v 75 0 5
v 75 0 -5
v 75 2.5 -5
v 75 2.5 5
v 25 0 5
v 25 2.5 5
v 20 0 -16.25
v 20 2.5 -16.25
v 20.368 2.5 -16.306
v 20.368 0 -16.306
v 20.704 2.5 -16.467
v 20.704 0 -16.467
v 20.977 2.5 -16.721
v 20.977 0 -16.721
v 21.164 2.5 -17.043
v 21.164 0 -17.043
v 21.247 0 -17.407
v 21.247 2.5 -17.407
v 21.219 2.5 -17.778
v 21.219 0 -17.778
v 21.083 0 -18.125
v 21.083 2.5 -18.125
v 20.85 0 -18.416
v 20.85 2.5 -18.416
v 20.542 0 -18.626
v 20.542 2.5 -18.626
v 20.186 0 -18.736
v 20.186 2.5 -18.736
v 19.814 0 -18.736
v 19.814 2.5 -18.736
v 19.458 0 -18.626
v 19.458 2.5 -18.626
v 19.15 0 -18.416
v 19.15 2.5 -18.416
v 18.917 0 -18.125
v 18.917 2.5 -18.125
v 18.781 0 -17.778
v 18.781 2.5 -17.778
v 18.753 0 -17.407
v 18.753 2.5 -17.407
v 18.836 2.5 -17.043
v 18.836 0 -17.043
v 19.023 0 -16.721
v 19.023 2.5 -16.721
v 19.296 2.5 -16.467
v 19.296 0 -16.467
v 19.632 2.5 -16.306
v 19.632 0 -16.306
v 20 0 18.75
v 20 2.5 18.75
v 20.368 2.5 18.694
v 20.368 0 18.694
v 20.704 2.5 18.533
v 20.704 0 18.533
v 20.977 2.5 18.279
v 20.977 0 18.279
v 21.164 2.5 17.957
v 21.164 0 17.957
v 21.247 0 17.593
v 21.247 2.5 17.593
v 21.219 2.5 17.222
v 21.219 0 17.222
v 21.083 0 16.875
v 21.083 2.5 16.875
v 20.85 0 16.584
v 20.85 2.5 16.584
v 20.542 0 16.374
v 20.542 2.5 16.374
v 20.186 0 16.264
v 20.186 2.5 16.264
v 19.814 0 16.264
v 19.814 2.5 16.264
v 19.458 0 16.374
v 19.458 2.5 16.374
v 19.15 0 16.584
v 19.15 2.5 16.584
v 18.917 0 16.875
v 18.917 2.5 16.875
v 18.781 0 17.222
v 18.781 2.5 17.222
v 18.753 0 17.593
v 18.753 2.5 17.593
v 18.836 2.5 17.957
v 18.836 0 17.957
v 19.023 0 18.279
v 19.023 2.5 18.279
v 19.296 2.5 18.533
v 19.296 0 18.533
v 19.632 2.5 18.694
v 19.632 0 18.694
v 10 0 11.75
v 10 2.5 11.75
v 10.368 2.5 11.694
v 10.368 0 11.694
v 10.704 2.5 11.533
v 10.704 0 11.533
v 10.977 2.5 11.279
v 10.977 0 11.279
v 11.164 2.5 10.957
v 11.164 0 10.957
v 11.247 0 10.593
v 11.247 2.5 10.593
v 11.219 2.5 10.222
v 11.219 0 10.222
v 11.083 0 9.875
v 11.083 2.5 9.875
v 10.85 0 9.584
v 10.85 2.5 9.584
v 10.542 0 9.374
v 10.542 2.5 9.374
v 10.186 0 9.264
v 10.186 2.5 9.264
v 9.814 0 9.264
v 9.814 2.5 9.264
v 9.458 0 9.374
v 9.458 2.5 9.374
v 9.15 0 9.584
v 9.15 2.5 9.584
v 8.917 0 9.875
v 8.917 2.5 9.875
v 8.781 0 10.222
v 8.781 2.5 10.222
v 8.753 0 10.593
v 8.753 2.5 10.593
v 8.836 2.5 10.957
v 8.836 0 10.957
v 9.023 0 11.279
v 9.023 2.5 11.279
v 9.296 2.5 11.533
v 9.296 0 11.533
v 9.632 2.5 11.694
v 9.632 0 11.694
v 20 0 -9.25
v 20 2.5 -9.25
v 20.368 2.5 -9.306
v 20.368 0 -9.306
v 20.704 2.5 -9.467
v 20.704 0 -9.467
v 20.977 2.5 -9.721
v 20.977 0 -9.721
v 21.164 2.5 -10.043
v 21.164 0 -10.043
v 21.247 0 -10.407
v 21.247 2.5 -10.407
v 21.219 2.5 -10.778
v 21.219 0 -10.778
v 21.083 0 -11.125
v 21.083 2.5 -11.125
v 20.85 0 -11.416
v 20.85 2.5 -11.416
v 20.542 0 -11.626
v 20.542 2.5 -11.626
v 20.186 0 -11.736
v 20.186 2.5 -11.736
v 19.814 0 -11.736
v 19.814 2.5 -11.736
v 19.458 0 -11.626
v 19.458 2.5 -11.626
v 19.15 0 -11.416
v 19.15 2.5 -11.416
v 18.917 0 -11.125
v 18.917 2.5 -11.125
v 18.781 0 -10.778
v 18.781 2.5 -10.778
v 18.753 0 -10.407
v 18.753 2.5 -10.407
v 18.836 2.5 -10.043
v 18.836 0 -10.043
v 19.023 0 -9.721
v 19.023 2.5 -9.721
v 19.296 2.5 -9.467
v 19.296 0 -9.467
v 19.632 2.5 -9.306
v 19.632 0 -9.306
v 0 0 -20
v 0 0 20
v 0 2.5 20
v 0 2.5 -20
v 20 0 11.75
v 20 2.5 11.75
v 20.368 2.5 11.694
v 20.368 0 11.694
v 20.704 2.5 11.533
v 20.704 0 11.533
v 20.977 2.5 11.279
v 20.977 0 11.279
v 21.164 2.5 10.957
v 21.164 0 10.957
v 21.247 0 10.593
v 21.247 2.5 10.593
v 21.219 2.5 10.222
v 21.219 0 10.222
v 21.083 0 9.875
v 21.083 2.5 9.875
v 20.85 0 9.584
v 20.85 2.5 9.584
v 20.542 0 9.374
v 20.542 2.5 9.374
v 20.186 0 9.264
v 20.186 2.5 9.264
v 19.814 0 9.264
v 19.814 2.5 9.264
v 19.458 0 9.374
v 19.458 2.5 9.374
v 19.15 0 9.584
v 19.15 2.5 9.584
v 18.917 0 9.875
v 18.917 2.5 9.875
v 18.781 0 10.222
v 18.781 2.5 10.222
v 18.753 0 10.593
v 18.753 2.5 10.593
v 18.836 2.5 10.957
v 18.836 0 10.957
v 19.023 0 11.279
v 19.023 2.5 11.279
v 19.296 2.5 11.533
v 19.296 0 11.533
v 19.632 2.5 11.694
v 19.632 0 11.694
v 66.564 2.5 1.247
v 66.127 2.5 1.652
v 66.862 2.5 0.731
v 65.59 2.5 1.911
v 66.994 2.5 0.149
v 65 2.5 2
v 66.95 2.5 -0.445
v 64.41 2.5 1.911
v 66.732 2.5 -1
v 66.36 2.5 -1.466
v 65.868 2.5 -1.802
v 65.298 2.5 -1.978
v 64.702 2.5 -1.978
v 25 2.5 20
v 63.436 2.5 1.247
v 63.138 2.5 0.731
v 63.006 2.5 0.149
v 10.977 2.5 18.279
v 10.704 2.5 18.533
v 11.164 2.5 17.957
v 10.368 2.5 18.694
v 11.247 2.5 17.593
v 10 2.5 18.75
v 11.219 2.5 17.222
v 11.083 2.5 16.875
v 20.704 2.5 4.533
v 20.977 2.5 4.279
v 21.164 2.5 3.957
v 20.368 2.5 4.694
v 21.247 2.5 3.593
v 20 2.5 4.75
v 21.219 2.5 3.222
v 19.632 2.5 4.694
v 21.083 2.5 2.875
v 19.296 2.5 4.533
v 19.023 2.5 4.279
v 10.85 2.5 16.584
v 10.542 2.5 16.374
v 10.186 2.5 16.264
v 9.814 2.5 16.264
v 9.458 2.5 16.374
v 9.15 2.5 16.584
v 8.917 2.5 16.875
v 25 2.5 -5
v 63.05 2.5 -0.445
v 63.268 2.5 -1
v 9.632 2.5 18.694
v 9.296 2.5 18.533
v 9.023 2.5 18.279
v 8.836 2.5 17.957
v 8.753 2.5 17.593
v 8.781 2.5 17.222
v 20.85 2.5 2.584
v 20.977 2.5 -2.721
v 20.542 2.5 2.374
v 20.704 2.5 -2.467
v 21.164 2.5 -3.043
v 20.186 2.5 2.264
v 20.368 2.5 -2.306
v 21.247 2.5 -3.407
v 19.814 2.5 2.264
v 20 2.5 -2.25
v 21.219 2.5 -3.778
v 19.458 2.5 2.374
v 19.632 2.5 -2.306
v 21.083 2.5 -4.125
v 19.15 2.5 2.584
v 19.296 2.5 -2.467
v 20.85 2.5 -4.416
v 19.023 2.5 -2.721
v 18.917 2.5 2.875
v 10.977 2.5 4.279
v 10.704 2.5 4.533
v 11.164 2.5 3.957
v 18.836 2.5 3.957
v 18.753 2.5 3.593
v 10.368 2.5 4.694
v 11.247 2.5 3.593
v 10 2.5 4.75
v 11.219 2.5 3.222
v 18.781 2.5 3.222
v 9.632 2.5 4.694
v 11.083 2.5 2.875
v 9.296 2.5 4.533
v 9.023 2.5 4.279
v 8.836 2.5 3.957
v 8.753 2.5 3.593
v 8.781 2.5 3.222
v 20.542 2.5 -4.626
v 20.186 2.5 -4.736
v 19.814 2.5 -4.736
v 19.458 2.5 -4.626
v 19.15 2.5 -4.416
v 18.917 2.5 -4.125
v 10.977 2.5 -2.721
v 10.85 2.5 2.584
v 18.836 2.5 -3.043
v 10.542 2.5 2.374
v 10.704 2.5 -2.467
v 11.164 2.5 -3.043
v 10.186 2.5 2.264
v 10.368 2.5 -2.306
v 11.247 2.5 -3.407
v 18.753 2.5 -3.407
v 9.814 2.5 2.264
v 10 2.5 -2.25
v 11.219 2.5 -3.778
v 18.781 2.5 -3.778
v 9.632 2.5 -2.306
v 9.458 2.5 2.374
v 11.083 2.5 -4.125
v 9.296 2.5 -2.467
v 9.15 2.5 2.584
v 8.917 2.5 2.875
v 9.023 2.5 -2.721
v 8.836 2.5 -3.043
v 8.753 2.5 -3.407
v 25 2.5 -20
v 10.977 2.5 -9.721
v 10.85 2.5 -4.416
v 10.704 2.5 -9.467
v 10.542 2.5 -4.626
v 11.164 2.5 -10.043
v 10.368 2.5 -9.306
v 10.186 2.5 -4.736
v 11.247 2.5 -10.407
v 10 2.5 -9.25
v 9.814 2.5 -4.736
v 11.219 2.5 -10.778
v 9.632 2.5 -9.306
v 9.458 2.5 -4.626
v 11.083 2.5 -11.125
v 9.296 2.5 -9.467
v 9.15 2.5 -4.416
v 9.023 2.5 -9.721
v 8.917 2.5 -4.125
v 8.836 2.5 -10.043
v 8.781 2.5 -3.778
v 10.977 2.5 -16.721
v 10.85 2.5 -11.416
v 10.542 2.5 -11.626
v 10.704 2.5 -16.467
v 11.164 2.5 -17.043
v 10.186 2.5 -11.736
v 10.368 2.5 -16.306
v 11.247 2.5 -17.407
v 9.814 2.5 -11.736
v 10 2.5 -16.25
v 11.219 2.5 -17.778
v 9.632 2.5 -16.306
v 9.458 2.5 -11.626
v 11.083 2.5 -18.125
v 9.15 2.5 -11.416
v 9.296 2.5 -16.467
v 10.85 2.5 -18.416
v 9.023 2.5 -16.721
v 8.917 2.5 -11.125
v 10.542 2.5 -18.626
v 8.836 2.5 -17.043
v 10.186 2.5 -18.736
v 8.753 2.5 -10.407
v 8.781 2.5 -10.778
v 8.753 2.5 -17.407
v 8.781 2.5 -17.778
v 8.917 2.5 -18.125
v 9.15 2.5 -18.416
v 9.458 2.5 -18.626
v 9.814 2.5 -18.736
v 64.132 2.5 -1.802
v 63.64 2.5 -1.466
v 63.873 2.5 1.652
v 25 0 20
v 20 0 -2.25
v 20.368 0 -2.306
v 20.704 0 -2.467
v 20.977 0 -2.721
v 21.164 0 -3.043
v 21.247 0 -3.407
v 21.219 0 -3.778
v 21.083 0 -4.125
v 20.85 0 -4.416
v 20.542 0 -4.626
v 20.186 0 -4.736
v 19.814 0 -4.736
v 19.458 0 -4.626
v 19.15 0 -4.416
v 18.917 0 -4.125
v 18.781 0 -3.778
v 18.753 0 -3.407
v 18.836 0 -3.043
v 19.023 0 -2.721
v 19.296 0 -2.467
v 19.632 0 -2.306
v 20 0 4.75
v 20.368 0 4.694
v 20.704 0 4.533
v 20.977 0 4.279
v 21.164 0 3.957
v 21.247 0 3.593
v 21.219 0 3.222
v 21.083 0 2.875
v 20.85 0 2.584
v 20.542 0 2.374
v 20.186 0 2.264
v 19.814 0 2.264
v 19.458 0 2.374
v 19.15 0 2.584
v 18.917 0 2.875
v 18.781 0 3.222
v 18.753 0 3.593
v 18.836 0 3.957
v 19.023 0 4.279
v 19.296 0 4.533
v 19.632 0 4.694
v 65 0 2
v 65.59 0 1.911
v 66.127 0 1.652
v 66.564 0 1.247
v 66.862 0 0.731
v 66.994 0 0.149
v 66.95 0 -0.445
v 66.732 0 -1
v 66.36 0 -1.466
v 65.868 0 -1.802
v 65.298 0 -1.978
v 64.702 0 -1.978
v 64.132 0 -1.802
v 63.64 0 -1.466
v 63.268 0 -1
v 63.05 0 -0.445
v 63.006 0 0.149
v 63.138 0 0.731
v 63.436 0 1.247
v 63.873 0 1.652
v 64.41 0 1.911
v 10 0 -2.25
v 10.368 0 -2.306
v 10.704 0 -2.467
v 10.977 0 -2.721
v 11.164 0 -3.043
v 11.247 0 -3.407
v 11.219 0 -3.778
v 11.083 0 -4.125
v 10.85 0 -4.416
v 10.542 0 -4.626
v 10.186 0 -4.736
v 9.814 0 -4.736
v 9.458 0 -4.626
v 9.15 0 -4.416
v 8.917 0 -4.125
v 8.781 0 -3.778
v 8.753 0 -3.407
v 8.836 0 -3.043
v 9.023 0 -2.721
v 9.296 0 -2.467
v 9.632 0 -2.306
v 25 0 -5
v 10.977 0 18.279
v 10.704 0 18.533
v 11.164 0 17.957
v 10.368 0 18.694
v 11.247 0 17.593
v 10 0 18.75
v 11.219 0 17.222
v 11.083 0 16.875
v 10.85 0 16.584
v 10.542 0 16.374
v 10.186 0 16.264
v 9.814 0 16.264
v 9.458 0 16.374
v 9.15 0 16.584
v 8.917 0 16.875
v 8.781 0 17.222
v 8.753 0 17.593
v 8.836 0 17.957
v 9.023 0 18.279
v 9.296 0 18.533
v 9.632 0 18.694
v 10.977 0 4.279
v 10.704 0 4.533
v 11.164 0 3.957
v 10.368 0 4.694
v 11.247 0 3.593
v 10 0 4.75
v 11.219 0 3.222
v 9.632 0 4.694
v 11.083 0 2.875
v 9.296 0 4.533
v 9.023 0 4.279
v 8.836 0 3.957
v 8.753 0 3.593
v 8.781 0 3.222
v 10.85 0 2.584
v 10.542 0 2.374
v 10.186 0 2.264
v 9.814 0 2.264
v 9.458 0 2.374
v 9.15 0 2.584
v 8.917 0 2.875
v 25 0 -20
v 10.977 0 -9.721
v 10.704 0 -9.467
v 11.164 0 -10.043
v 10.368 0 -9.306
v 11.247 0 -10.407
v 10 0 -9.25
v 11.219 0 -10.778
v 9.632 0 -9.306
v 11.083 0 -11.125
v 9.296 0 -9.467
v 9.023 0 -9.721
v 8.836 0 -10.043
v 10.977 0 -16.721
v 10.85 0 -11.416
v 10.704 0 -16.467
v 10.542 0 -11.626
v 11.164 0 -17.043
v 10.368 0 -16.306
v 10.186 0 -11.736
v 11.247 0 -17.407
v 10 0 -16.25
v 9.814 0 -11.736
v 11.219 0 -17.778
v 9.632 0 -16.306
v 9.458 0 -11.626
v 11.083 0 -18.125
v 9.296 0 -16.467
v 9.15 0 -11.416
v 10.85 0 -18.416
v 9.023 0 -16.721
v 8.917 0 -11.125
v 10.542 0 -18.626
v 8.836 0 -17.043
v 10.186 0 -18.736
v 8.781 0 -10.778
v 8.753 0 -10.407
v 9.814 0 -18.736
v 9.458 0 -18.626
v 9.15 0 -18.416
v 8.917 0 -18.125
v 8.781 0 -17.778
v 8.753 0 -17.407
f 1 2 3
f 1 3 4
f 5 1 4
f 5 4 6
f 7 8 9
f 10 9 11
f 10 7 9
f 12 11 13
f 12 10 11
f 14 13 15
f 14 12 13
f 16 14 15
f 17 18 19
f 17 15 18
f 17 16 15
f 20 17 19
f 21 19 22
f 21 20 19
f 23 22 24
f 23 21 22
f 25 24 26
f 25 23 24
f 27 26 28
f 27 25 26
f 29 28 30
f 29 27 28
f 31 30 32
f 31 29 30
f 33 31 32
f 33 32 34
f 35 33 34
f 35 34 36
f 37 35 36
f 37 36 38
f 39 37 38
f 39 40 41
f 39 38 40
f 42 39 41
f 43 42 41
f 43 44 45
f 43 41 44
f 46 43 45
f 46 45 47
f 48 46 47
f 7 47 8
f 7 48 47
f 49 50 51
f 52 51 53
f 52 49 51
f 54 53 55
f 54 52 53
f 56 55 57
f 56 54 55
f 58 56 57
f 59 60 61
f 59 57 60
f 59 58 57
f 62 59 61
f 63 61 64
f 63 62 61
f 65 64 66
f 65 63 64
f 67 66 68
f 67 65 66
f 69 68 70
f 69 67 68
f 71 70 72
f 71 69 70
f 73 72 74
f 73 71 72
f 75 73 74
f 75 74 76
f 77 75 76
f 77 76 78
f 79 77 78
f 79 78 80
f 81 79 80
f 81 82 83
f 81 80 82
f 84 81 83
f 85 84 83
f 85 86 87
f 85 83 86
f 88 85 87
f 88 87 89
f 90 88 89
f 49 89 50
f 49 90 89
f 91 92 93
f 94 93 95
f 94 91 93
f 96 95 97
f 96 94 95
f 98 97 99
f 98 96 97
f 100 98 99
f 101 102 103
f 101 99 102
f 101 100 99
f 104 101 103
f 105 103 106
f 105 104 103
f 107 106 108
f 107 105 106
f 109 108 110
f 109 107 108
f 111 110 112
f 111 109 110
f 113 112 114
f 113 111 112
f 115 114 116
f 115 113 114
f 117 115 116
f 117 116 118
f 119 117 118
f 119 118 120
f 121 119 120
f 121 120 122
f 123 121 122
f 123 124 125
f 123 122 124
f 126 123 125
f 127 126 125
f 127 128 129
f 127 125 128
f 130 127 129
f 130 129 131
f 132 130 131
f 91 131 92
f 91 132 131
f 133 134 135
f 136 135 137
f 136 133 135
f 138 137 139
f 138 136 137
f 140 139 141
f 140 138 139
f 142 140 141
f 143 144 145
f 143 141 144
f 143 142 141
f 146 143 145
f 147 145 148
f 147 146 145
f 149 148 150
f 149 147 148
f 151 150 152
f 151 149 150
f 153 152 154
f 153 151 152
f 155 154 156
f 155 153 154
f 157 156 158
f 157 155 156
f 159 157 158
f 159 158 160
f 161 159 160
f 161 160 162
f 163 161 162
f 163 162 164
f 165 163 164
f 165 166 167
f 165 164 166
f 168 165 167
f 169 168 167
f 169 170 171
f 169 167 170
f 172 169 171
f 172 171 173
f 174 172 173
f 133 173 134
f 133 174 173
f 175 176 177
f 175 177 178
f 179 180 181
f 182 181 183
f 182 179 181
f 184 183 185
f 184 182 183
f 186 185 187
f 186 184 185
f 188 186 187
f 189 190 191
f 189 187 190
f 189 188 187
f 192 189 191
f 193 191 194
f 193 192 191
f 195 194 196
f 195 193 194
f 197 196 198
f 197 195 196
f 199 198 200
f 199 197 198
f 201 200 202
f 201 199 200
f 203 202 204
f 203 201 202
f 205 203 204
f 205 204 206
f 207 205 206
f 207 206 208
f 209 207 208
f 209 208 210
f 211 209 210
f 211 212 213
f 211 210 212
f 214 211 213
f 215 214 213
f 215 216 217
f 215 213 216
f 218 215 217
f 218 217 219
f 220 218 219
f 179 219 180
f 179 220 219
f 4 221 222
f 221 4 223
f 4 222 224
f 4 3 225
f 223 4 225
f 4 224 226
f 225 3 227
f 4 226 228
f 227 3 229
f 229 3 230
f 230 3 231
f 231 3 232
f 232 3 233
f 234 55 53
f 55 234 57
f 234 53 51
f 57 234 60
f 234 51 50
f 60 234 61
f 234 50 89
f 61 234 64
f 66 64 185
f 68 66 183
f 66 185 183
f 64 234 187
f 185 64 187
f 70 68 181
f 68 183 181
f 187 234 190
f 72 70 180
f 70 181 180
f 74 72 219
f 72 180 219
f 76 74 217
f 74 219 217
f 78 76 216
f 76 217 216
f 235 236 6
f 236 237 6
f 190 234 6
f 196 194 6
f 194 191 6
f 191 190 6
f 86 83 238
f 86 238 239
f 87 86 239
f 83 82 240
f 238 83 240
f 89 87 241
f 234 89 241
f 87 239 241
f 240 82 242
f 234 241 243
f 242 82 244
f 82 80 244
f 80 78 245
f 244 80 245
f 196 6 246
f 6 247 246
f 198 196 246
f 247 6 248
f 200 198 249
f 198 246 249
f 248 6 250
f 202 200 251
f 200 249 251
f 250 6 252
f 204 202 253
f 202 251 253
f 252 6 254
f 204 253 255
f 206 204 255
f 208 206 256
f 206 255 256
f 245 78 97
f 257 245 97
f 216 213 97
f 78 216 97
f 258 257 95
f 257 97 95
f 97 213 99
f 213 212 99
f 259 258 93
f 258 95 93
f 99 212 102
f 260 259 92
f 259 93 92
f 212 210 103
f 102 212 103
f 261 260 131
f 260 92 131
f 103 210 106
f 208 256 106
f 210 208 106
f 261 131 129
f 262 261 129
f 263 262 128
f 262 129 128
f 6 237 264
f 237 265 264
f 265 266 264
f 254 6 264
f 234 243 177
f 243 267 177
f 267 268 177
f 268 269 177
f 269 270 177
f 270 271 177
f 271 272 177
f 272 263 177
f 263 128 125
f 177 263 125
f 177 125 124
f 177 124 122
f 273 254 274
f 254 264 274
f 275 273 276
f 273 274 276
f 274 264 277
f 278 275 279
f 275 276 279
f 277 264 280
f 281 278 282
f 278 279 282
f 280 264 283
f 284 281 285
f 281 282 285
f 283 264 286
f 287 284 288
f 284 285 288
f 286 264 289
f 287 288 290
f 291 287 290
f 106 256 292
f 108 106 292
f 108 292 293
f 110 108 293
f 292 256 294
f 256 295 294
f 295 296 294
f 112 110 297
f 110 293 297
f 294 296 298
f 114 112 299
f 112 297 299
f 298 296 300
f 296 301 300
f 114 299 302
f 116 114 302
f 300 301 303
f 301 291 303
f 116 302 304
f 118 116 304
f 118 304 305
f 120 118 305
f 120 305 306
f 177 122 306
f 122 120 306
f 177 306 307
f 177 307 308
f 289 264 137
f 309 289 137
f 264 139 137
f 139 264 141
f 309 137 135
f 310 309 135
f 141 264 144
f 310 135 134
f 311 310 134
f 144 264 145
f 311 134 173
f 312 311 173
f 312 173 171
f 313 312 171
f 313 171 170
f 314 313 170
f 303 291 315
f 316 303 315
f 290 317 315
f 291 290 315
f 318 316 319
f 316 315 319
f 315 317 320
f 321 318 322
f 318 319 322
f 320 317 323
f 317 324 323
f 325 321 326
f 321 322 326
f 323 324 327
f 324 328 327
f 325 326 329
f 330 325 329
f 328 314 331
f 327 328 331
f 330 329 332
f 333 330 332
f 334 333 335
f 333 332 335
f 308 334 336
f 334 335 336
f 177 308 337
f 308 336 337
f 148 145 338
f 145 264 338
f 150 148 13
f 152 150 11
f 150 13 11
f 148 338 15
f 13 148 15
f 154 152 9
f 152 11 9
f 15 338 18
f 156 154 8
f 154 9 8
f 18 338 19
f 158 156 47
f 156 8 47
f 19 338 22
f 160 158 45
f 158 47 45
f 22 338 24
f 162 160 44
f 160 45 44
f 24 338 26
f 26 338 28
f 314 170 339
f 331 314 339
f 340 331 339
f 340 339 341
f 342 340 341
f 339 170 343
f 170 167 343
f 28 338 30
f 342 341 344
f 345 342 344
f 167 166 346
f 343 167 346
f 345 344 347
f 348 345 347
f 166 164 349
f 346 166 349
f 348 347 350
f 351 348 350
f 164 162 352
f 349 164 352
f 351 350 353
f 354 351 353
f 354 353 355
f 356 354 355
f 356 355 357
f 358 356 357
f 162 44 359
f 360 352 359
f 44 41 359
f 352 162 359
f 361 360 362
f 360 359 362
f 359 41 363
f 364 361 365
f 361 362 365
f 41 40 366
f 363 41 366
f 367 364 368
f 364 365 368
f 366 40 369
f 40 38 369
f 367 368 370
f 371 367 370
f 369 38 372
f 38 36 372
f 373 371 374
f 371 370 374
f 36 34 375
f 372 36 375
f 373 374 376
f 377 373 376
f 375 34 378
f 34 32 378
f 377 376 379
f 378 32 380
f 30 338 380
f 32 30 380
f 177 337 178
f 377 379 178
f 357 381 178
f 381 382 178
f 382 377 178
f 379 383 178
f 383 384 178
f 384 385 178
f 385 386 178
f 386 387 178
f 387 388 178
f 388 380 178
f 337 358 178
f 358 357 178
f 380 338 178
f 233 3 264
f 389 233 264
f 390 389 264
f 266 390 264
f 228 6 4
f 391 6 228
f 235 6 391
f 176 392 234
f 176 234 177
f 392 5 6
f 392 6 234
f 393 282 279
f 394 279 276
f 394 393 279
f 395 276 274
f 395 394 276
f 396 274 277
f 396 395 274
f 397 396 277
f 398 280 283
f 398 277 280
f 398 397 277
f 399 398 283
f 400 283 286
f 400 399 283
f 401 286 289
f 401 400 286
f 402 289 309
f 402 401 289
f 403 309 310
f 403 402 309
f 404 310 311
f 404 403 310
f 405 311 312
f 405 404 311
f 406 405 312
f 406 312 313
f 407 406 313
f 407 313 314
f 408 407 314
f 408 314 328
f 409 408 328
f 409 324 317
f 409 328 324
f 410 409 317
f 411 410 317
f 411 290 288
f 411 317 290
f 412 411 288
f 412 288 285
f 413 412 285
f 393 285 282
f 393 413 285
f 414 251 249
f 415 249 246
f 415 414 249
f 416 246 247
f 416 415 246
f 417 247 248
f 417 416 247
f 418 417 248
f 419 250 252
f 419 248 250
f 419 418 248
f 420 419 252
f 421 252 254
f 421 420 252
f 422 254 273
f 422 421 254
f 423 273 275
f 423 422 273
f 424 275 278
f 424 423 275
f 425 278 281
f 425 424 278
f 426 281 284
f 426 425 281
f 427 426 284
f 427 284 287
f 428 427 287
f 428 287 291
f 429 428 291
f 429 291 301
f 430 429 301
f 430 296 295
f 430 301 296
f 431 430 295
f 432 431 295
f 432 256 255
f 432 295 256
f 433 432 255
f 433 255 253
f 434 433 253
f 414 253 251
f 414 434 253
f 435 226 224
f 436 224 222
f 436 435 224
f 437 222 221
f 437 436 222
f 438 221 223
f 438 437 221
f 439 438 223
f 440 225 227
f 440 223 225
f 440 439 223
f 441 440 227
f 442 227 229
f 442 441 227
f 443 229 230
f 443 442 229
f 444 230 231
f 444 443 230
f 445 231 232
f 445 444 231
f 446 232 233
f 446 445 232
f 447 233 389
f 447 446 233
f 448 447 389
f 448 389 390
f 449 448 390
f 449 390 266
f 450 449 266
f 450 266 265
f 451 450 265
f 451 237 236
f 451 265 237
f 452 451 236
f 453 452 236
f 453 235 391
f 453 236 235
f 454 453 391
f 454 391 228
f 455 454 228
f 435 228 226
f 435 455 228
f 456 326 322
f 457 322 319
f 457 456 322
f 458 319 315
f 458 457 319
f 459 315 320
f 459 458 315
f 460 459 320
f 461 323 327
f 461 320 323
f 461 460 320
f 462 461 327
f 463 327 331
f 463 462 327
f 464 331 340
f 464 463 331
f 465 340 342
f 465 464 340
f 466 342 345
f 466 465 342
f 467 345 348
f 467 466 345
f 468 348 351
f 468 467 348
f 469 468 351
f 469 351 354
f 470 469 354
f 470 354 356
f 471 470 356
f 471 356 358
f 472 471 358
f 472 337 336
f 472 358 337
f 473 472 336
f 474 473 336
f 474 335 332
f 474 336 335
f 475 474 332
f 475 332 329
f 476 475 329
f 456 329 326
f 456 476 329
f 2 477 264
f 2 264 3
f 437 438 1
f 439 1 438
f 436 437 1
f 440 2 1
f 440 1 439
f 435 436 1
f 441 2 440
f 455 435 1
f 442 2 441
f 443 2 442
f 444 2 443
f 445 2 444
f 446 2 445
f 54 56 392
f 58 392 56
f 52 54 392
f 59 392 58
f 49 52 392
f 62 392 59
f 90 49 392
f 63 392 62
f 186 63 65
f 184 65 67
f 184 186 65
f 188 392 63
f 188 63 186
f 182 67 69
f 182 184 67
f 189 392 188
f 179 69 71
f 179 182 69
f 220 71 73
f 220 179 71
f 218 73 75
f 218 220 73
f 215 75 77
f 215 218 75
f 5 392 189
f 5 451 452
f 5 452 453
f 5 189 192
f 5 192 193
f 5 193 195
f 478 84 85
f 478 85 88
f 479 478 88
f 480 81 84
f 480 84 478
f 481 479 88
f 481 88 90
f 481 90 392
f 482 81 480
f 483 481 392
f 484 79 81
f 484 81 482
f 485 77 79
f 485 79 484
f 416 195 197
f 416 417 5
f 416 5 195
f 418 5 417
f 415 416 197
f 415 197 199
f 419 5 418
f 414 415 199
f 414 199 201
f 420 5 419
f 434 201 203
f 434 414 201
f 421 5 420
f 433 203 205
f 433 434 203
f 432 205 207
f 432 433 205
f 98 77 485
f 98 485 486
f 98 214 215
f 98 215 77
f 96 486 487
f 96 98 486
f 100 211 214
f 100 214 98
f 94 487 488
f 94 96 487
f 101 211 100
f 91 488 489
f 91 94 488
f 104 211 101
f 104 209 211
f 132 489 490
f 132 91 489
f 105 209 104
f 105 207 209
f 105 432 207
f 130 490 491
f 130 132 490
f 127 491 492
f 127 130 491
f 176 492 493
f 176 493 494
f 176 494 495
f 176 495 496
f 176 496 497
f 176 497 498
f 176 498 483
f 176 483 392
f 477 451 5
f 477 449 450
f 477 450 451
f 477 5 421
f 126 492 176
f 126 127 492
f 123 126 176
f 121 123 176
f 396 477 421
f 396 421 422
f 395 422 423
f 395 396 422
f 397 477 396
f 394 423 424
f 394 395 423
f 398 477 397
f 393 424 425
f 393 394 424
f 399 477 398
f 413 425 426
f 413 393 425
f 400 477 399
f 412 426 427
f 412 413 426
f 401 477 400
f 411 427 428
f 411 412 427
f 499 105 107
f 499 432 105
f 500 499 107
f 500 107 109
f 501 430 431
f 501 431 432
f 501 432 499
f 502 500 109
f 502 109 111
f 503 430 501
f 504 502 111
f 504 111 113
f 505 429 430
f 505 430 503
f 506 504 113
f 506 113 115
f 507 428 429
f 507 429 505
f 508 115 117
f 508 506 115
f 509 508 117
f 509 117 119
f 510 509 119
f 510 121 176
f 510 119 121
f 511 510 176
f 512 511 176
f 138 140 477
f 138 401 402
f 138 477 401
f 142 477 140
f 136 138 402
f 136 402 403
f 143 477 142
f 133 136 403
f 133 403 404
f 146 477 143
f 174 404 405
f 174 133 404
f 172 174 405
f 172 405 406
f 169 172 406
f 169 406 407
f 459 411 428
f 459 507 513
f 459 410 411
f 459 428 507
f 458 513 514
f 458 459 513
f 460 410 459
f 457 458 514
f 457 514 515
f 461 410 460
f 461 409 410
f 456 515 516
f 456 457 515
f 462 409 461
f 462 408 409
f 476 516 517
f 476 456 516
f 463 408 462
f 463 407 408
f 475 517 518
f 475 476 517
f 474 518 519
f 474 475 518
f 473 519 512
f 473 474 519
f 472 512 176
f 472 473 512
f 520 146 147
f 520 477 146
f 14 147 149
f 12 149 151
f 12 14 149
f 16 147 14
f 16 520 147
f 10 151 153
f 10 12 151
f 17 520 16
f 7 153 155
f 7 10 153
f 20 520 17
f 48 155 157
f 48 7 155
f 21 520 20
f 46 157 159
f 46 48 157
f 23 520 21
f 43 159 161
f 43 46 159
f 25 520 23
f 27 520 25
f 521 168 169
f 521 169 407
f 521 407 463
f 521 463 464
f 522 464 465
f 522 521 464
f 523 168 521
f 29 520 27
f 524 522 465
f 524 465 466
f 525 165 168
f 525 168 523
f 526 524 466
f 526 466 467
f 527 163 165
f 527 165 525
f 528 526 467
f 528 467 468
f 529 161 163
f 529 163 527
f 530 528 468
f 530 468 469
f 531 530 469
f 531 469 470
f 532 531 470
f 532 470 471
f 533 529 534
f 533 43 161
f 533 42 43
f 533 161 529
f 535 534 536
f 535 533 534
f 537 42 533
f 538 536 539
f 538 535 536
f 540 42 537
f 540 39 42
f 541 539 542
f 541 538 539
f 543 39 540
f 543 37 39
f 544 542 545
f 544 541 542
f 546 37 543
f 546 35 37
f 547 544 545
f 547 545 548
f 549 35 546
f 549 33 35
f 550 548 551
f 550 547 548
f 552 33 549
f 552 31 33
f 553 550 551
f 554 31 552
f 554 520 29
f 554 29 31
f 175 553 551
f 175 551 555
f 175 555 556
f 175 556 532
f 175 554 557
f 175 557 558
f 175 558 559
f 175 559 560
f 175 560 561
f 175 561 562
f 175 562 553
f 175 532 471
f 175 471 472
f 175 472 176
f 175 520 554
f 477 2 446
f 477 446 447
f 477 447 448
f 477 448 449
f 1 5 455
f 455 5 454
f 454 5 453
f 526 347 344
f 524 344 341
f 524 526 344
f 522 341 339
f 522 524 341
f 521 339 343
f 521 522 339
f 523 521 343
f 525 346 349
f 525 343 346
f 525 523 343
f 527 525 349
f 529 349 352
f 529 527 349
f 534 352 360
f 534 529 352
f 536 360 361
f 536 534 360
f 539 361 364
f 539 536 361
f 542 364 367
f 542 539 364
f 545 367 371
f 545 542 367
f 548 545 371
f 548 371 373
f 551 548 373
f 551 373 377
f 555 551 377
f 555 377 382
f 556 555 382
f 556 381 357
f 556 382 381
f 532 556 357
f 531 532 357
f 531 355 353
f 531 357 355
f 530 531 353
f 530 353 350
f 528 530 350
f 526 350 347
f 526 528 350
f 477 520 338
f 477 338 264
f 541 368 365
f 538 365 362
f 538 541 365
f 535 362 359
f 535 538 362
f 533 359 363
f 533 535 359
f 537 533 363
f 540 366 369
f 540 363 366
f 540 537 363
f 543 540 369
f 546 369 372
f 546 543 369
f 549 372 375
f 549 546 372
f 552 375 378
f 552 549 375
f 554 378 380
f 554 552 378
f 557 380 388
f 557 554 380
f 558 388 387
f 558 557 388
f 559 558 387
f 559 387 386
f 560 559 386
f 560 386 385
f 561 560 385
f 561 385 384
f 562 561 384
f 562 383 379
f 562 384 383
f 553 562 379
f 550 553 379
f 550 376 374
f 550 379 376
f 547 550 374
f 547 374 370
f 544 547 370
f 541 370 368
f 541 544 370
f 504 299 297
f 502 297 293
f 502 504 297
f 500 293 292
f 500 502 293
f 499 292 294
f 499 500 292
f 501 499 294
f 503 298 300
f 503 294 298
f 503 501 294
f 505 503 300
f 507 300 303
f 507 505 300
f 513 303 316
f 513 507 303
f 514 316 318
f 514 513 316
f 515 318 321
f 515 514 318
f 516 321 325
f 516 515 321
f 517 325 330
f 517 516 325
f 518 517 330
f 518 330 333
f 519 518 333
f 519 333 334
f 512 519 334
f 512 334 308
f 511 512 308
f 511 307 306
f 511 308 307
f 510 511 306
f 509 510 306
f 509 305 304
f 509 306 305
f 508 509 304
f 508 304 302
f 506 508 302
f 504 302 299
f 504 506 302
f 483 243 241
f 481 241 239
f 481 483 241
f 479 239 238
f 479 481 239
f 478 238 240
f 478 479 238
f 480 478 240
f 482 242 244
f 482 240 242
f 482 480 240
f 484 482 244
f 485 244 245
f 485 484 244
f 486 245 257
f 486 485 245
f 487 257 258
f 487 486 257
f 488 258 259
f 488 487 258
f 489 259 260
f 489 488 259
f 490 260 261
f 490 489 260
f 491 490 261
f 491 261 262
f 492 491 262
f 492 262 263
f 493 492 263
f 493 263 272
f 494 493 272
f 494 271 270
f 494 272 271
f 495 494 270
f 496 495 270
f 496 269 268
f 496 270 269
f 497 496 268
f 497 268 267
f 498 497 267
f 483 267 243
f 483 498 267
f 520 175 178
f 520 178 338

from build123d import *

# Parameters (mm, degrees)
EXTRUDE_1_DEPTH     = 2.5
SKETCH_2_R          = 1.25
CUT_EXTRUDE_1_DEPTH = 78.661122835
SKETCH_3_R          = 2
CUT_EXTRUDE_2_DEPTH = 10


with BuildPart() as part:
    # 草图1 → 凸台-拉伸1 (new body)
    with BuildSketch(Plane(origin=(0, 0, 0), x_dir=(1, 0, 0), z_dir=(0, 1, 0))):
        Polygon((0, -20), (0, 20), (25, 20), (25, 5), (75, 5), (75, -5), (25, -5), (25, -20), align=None)
    extrude(amount=EXTRUDE_1_DEPTH)

    # 草图2 → 切除-拉伸1 (cut, through all)
    with BuildSketch(Plane(origin=(0, 0, 0), x_dir=(1, 0, 0), z_dir=(0, 1, 0))):
        with Locations(Location((10, 17.5, 0), (0, 0, 270))):
            Circle(SKETCH_2_R)
        with Locations(Location((20, 17.5, 0), (0, 0, 270))):
            Circle(SKETCH_2_R)
        with Locations(Location((20, 10.5, 0), (0, 0, 270))):
            Circle(SKETCH_2_R)
        with Locations(Location((20, 3.5, 0), (0, 0, 270))):
            Circle(SKETCH_2_R)
        with Locations(Location((20, -3.5, 0), (0, 0, 270))):
            Circle(SKETCH_2_R)
        with Locations(Location((20, -10.5, 0), (0, 0, 270))):
            Circle(SKETCH_2_R)
        with Locations(Location((20, -17.5, 0), (0, 0, 270))):
            Circle(SKETCH_2_R)
        with Locations(Location((10, 10.5, 0), (0, 0, 270))):
            Circle(SKETCH_2_R)
        with Locations(Location((10, 3.5, 0), (0, 0, 270))):
            Circle(SKETCH_2_R)
        with Locations(Location((10, -3.5, 0), (0, 0, 270))):
            Circle(SKETCH_2_R)
        with Locations(Location((10, -10.5, 0), (0, 0, 270))):
            Circle(SKETCH_2_R)
        with Locations(Location((10, -17.5, 0), (0, 0, 270))):
            Circle(SKETCH_2_R)
    extrude(amount=CUT_EXTRUDE_1_DEPTH, mode=Mode.SUBTRACT)

    # 草图3 → 切除-拉伸2 (cut)
    with BuildSketch(Plane(origin=(0, 0, 0), x_dir=(1, 0, 0), z_dir=(0, 1, 0))):
        with Locations(Location((65, 0, 0), (0, 0, 270))):
            Circle(SKETCH_3_R)
    extrude(amount=CUT_EXTRUDE_2_DEPTH, mode=Mode.SUBTRACT)


solid = part.part
